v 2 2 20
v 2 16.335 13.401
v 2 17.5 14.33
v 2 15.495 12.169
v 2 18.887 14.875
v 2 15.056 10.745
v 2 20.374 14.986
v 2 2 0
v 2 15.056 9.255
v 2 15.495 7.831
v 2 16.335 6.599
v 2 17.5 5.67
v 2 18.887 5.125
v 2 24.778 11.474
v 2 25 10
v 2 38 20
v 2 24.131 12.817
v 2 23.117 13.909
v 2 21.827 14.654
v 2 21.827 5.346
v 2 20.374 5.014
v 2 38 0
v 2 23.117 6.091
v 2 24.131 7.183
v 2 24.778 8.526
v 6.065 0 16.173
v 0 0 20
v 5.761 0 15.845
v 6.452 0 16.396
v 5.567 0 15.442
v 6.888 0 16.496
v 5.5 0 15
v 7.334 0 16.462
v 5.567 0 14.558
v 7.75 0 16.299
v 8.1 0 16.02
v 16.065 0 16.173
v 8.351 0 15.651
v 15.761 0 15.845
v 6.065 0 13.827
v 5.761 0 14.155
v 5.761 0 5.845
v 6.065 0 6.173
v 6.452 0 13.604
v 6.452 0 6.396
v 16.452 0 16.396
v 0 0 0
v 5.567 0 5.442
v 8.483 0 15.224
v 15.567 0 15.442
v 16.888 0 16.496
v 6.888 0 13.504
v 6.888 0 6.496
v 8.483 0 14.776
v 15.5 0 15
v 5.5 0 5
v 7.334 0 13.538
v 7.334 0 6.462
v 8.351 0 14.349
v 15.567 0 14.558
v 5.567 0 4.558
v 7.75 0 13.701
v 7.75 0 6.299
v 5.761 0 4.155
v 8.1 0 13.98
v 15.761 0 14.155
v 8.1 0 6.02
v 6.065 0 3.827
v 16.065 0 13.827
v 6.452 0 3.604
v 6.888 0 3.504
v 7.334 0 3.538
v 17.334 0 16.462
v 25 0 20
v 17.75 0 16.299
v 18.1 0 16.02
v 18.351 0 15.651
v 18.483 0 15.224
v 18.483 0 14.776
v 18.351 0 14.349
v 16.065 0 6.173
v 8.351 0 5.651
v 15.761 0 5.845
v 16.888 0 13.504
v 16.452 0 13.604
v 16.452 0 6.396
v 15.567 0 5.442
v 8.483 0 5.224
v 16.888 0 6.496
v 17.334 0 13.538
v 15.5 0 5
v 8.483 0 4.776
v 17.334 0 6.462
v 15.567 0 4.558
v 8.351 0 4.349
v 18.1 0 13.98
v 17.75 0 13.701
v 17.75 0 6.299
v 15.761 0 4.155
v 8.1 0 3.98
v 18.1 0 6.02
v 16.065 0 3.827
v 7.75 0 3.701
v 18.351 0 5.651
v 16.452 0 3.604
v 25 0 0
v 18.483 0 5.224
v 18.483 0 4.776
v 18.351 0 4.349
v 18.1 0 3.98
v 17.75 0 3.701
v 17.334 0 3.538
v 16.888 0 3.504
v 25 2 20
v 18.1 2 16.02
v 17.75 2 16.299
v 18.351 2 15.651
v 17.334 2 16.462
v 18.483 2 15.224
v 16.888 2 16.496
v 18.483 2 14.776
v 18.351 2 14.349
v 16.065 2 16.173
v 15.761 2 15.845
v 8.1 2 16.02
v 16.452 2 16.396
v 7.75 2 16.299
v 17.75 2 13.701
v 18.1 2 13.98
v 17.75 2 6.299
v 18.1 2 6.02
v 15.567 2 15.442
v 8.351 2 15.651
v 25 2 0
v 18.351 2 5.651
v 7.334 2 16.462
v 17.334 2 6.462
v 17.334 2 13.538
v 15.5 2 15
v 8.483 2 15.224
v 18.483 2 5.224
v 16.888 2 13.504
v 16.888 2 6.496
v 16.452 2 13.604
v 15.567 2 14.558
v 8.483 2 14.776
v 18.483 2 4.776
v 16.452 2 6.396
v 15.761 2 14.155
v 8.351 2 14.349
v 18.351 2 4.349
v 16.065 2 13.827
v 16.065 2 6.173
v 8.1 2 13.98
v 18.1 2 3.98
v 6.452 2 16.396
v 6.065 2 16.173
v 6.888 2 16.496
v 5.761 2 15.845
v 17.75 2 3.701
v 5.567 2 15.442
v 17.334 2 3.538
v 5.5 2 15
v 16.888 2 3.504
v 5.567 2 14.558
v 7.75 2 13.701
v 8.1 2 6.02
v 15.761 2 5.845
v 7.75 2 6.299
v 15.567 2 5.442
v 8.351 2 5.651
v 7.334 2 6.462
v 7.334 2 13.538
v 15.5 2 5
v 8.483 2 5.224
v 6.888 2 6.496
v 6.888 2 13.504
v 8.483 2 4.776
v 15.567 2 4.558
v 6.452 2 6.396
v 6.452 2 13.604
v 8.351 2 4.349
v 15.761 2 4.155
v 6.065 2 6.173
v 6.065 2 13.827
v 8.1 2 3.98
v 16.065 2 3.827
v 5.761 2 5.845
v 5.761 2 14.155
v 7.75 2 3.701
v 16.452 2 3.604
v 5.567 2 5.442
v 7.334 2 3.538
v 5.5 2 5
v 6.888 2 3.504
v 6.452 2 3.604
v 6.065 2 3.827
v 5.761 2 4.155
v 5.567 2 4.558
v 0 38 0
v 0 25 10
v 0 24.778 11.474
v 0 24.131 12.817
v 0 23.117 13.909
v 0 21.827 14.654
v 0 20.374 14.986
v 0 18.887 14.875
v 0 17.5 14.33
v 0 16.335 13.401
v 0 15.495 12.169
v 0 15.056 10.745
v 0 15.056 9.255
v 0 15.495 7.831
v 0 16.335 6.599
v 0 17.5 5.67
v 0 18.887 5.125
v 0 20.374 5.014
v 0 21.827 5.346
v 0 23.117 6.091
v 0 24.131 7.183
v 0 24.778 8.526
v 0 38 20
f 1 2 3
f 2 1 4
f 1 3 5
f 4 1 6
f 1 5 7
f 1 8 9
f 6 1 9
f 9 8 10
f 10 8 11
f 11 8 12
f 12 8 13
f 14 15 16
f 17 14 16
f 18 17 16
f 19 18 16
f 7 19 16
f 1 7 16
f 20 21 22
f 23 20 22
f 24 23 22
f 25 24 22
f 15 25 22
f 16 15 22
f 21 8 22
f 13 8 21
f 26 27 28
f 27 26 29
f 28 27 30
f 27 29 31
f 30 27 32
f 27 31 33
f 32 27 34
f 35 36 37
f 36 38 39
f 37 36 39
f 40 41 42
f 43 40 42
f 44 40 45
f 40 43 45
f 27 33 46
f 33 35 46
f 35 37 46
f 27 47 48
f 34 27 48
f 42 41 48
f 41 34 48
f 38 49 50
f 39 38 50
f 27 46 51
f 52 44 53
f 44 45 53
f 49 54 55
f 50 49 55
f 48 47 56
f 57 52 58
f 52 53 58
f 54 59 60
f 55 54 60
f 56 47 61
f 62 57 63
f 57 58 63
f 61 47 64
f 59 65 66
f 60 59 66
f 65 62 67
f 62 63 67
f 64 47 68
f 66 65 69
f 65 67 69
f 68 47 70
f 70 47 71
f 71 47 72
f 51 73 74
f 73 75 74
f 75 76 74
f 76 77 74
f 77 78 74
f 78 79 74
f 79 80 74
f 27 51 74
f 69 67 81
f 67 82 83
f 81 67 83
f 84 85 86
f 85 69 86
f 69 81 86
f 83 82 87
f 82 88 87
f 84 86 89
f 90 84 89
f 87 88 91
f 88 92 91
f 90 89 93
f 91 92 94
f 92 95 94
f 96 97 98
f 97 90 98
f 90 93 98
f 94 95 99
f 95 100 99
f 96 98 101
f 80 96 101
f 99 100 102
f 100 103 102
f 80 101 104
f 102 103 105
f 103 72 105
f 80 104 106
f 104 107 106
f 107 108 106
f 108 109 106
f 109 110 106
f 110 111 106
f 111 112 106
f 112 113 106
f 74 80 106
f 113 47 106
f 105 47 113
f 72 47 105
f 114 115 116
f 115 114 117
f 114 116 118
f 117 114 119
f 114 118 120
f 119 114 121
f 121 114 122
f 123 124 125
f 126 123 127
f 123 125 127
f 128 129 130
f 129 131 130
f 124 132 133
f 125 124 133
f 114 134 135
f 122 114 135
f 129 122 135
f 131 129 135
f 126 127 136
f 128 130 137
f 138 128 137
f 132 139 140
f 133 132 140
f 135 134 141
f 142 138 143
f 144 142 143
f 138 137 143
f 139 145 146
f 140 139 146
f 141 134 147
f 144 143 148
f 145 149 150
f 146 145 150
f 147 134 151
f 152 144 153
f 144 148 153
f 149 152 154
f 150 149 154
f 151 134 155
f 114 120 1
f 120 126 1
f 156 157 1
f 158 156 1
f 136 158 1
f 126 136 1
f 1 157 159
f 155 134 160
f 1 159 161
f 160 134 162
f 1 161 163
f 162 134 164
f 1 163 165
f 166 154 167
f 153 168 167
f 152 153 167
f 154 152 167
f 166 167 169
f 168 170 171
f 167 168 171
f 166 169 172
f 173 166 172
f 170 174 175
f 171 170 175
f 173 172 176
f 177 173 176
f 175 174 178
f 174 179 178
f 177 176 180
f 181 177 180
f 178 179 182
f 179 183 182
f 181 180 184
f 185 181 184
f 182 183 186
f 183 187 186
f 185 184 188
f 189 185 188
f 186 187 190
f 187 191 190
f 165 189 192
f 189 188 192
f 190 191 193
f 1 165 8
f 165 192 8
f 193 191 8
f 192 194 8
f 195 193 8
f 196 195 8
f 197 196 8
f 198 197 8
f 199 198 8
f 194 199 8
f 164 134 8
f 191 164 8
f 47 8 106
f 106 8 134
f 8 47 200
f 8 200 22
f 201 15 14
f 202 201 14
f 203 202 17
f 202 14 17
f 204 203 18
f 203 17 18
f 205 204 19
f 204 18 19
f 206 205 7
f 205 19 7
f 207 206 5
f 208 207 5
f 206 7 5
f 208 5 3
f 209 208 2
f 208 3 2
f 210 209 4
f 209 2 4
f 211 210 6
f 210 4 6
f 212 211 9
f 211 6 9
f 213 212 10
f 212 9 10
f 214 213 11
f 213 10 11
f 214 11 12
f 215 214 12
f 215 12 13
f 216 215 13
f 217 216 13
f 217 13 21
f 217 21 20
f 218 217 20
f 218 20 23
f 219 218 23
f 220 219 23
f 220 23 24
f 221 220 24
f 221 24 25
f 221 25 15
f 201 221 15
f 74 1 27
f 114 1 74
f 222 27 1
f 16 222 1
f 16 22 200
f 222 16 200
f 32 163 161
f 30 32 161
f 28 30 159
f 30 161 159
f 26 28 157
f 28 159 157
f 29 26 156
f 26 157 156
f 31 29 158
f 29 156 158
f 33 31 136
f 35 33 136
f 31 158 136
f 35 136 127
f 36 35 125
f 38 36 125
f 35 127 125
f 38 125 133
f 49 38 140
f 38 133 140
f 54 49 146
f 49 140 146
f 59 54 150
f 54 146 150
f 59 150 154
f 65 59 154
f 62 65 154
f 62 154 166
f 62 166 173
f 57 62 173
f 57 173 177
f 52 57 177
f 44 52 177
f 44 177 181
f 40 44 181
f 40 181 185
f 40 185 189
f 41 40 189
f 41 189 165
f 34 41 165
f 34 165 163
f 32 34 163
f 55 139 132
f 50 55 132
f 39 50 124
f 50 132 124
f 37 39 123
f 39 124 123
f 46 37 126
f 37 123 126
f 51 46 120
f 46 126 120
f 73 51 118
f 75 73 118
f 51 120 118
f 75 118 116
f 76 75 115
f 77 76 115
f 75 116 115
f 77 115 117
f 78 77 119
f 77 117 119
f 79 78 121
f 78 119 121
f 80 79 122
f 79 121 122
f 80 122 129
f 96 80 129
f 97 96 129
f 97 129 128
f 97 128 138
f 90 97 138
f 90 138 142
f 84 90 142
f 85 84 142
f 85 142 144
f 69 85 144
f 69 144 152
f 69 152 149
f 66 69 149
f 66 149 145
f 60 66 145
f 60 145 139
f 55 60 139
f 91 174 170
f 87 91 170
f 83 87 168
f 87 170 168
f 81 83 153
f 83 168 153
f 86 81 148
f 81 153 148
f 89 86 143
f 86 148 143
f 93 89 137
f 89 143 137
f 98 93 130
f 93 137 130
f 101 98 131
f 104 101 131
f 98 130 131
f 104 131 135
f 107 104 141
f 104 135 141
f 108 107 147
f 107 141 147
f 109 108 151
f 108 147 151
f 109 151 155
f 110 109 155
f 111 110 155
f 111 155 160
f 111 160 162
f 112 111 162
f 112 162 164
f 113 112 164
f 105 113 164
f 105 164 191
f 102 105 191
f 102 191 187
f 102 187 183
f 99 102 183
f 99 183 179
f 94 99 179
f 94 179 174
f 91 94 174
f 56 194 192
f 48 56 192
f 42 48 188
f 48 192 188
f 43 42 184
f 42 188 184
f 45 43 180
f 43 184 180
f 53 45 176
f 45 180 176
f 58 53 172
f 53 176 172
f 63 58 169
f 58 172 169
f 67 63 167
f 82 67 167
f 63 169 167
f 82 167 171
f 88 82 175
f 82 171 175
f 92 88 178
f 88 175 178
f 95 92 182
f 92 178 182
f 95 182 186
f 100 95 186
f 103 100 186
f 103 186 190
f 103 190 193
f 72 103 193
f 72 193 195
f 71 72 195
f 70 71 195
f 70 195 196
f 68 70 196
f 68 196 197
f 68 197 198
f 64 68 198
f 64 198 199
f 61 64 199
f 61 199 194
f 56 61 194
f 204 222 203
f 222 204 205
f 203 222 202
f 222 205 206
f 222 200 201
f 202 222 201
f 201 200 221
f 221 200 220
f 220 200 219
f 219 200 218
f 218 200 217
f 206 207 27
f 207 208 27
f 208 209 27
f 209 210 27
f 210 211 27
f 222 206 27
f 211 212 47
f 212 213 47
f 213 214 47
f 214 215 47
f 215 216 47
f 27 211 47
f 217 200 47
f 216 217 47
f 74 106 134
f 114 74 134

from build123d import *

# Parameters (mm, degrees)
EXTRUDE_1_DEPTH     = 20
SKETCH_3_R          = 1.5
CUT_EXTRUDE_1_DEPTH = 20
SKETCH_4_R          = 5
CUT_EXTRUDE_2_DEPTH = 20


with BuildPart() as part:
    # 草图1 → 凸台-拉伸1 (new body)
    with BuildSketch(Plane.XY):
        Polygon((0, 0), (25, 0), (25, 2), (2, 2), (2, 38), (0, 38), align=None)
    extrude(amount=EXTRUDE_1_DEPTH)

    # 草图3 → 切除-拉伸1 (cut)
    with BuildSketch(Plane(origin=(0, 2, 0), x_dir=(1, 0, 0), z_dir=(0, 1, 0))):
        with Locations(Location((17, -5, 0), (0, 0, 180))):
            Circle(SKETCH_3_R)
        with Locations(Location((17, -15, 0), (0, 0, 180))):
            Circle(SKETCH_3_R)
        with Locations(Location((7, -5, 0), (0, 0, 180))):
            Circle(SKETCH_3_R)
        with Locations(Location((7, -15, 0), (0, 0, 180))):
            Circle(SKETCH_3_R)
    extrude(amount=-CUT_EXTRUDE_1_DEPTH, mode=Mode.SUBTRACT)

    # 草图4 → 切除-拉伸2 (cut)
    with BuildSketch(Plane(origin=(2, 0, 0), x_dir=(0, 0, -1), z_dir=(1, 0, 0))):
        with Locations(Location((-10, 20, 0), (0, 0, 90))):
            Circle(SKETCH_4_R)
    extrude(amount=-CUT_EXTRUDE_2_DEPTH, mode=Mode.SUBTRACT)


solid = part.part
